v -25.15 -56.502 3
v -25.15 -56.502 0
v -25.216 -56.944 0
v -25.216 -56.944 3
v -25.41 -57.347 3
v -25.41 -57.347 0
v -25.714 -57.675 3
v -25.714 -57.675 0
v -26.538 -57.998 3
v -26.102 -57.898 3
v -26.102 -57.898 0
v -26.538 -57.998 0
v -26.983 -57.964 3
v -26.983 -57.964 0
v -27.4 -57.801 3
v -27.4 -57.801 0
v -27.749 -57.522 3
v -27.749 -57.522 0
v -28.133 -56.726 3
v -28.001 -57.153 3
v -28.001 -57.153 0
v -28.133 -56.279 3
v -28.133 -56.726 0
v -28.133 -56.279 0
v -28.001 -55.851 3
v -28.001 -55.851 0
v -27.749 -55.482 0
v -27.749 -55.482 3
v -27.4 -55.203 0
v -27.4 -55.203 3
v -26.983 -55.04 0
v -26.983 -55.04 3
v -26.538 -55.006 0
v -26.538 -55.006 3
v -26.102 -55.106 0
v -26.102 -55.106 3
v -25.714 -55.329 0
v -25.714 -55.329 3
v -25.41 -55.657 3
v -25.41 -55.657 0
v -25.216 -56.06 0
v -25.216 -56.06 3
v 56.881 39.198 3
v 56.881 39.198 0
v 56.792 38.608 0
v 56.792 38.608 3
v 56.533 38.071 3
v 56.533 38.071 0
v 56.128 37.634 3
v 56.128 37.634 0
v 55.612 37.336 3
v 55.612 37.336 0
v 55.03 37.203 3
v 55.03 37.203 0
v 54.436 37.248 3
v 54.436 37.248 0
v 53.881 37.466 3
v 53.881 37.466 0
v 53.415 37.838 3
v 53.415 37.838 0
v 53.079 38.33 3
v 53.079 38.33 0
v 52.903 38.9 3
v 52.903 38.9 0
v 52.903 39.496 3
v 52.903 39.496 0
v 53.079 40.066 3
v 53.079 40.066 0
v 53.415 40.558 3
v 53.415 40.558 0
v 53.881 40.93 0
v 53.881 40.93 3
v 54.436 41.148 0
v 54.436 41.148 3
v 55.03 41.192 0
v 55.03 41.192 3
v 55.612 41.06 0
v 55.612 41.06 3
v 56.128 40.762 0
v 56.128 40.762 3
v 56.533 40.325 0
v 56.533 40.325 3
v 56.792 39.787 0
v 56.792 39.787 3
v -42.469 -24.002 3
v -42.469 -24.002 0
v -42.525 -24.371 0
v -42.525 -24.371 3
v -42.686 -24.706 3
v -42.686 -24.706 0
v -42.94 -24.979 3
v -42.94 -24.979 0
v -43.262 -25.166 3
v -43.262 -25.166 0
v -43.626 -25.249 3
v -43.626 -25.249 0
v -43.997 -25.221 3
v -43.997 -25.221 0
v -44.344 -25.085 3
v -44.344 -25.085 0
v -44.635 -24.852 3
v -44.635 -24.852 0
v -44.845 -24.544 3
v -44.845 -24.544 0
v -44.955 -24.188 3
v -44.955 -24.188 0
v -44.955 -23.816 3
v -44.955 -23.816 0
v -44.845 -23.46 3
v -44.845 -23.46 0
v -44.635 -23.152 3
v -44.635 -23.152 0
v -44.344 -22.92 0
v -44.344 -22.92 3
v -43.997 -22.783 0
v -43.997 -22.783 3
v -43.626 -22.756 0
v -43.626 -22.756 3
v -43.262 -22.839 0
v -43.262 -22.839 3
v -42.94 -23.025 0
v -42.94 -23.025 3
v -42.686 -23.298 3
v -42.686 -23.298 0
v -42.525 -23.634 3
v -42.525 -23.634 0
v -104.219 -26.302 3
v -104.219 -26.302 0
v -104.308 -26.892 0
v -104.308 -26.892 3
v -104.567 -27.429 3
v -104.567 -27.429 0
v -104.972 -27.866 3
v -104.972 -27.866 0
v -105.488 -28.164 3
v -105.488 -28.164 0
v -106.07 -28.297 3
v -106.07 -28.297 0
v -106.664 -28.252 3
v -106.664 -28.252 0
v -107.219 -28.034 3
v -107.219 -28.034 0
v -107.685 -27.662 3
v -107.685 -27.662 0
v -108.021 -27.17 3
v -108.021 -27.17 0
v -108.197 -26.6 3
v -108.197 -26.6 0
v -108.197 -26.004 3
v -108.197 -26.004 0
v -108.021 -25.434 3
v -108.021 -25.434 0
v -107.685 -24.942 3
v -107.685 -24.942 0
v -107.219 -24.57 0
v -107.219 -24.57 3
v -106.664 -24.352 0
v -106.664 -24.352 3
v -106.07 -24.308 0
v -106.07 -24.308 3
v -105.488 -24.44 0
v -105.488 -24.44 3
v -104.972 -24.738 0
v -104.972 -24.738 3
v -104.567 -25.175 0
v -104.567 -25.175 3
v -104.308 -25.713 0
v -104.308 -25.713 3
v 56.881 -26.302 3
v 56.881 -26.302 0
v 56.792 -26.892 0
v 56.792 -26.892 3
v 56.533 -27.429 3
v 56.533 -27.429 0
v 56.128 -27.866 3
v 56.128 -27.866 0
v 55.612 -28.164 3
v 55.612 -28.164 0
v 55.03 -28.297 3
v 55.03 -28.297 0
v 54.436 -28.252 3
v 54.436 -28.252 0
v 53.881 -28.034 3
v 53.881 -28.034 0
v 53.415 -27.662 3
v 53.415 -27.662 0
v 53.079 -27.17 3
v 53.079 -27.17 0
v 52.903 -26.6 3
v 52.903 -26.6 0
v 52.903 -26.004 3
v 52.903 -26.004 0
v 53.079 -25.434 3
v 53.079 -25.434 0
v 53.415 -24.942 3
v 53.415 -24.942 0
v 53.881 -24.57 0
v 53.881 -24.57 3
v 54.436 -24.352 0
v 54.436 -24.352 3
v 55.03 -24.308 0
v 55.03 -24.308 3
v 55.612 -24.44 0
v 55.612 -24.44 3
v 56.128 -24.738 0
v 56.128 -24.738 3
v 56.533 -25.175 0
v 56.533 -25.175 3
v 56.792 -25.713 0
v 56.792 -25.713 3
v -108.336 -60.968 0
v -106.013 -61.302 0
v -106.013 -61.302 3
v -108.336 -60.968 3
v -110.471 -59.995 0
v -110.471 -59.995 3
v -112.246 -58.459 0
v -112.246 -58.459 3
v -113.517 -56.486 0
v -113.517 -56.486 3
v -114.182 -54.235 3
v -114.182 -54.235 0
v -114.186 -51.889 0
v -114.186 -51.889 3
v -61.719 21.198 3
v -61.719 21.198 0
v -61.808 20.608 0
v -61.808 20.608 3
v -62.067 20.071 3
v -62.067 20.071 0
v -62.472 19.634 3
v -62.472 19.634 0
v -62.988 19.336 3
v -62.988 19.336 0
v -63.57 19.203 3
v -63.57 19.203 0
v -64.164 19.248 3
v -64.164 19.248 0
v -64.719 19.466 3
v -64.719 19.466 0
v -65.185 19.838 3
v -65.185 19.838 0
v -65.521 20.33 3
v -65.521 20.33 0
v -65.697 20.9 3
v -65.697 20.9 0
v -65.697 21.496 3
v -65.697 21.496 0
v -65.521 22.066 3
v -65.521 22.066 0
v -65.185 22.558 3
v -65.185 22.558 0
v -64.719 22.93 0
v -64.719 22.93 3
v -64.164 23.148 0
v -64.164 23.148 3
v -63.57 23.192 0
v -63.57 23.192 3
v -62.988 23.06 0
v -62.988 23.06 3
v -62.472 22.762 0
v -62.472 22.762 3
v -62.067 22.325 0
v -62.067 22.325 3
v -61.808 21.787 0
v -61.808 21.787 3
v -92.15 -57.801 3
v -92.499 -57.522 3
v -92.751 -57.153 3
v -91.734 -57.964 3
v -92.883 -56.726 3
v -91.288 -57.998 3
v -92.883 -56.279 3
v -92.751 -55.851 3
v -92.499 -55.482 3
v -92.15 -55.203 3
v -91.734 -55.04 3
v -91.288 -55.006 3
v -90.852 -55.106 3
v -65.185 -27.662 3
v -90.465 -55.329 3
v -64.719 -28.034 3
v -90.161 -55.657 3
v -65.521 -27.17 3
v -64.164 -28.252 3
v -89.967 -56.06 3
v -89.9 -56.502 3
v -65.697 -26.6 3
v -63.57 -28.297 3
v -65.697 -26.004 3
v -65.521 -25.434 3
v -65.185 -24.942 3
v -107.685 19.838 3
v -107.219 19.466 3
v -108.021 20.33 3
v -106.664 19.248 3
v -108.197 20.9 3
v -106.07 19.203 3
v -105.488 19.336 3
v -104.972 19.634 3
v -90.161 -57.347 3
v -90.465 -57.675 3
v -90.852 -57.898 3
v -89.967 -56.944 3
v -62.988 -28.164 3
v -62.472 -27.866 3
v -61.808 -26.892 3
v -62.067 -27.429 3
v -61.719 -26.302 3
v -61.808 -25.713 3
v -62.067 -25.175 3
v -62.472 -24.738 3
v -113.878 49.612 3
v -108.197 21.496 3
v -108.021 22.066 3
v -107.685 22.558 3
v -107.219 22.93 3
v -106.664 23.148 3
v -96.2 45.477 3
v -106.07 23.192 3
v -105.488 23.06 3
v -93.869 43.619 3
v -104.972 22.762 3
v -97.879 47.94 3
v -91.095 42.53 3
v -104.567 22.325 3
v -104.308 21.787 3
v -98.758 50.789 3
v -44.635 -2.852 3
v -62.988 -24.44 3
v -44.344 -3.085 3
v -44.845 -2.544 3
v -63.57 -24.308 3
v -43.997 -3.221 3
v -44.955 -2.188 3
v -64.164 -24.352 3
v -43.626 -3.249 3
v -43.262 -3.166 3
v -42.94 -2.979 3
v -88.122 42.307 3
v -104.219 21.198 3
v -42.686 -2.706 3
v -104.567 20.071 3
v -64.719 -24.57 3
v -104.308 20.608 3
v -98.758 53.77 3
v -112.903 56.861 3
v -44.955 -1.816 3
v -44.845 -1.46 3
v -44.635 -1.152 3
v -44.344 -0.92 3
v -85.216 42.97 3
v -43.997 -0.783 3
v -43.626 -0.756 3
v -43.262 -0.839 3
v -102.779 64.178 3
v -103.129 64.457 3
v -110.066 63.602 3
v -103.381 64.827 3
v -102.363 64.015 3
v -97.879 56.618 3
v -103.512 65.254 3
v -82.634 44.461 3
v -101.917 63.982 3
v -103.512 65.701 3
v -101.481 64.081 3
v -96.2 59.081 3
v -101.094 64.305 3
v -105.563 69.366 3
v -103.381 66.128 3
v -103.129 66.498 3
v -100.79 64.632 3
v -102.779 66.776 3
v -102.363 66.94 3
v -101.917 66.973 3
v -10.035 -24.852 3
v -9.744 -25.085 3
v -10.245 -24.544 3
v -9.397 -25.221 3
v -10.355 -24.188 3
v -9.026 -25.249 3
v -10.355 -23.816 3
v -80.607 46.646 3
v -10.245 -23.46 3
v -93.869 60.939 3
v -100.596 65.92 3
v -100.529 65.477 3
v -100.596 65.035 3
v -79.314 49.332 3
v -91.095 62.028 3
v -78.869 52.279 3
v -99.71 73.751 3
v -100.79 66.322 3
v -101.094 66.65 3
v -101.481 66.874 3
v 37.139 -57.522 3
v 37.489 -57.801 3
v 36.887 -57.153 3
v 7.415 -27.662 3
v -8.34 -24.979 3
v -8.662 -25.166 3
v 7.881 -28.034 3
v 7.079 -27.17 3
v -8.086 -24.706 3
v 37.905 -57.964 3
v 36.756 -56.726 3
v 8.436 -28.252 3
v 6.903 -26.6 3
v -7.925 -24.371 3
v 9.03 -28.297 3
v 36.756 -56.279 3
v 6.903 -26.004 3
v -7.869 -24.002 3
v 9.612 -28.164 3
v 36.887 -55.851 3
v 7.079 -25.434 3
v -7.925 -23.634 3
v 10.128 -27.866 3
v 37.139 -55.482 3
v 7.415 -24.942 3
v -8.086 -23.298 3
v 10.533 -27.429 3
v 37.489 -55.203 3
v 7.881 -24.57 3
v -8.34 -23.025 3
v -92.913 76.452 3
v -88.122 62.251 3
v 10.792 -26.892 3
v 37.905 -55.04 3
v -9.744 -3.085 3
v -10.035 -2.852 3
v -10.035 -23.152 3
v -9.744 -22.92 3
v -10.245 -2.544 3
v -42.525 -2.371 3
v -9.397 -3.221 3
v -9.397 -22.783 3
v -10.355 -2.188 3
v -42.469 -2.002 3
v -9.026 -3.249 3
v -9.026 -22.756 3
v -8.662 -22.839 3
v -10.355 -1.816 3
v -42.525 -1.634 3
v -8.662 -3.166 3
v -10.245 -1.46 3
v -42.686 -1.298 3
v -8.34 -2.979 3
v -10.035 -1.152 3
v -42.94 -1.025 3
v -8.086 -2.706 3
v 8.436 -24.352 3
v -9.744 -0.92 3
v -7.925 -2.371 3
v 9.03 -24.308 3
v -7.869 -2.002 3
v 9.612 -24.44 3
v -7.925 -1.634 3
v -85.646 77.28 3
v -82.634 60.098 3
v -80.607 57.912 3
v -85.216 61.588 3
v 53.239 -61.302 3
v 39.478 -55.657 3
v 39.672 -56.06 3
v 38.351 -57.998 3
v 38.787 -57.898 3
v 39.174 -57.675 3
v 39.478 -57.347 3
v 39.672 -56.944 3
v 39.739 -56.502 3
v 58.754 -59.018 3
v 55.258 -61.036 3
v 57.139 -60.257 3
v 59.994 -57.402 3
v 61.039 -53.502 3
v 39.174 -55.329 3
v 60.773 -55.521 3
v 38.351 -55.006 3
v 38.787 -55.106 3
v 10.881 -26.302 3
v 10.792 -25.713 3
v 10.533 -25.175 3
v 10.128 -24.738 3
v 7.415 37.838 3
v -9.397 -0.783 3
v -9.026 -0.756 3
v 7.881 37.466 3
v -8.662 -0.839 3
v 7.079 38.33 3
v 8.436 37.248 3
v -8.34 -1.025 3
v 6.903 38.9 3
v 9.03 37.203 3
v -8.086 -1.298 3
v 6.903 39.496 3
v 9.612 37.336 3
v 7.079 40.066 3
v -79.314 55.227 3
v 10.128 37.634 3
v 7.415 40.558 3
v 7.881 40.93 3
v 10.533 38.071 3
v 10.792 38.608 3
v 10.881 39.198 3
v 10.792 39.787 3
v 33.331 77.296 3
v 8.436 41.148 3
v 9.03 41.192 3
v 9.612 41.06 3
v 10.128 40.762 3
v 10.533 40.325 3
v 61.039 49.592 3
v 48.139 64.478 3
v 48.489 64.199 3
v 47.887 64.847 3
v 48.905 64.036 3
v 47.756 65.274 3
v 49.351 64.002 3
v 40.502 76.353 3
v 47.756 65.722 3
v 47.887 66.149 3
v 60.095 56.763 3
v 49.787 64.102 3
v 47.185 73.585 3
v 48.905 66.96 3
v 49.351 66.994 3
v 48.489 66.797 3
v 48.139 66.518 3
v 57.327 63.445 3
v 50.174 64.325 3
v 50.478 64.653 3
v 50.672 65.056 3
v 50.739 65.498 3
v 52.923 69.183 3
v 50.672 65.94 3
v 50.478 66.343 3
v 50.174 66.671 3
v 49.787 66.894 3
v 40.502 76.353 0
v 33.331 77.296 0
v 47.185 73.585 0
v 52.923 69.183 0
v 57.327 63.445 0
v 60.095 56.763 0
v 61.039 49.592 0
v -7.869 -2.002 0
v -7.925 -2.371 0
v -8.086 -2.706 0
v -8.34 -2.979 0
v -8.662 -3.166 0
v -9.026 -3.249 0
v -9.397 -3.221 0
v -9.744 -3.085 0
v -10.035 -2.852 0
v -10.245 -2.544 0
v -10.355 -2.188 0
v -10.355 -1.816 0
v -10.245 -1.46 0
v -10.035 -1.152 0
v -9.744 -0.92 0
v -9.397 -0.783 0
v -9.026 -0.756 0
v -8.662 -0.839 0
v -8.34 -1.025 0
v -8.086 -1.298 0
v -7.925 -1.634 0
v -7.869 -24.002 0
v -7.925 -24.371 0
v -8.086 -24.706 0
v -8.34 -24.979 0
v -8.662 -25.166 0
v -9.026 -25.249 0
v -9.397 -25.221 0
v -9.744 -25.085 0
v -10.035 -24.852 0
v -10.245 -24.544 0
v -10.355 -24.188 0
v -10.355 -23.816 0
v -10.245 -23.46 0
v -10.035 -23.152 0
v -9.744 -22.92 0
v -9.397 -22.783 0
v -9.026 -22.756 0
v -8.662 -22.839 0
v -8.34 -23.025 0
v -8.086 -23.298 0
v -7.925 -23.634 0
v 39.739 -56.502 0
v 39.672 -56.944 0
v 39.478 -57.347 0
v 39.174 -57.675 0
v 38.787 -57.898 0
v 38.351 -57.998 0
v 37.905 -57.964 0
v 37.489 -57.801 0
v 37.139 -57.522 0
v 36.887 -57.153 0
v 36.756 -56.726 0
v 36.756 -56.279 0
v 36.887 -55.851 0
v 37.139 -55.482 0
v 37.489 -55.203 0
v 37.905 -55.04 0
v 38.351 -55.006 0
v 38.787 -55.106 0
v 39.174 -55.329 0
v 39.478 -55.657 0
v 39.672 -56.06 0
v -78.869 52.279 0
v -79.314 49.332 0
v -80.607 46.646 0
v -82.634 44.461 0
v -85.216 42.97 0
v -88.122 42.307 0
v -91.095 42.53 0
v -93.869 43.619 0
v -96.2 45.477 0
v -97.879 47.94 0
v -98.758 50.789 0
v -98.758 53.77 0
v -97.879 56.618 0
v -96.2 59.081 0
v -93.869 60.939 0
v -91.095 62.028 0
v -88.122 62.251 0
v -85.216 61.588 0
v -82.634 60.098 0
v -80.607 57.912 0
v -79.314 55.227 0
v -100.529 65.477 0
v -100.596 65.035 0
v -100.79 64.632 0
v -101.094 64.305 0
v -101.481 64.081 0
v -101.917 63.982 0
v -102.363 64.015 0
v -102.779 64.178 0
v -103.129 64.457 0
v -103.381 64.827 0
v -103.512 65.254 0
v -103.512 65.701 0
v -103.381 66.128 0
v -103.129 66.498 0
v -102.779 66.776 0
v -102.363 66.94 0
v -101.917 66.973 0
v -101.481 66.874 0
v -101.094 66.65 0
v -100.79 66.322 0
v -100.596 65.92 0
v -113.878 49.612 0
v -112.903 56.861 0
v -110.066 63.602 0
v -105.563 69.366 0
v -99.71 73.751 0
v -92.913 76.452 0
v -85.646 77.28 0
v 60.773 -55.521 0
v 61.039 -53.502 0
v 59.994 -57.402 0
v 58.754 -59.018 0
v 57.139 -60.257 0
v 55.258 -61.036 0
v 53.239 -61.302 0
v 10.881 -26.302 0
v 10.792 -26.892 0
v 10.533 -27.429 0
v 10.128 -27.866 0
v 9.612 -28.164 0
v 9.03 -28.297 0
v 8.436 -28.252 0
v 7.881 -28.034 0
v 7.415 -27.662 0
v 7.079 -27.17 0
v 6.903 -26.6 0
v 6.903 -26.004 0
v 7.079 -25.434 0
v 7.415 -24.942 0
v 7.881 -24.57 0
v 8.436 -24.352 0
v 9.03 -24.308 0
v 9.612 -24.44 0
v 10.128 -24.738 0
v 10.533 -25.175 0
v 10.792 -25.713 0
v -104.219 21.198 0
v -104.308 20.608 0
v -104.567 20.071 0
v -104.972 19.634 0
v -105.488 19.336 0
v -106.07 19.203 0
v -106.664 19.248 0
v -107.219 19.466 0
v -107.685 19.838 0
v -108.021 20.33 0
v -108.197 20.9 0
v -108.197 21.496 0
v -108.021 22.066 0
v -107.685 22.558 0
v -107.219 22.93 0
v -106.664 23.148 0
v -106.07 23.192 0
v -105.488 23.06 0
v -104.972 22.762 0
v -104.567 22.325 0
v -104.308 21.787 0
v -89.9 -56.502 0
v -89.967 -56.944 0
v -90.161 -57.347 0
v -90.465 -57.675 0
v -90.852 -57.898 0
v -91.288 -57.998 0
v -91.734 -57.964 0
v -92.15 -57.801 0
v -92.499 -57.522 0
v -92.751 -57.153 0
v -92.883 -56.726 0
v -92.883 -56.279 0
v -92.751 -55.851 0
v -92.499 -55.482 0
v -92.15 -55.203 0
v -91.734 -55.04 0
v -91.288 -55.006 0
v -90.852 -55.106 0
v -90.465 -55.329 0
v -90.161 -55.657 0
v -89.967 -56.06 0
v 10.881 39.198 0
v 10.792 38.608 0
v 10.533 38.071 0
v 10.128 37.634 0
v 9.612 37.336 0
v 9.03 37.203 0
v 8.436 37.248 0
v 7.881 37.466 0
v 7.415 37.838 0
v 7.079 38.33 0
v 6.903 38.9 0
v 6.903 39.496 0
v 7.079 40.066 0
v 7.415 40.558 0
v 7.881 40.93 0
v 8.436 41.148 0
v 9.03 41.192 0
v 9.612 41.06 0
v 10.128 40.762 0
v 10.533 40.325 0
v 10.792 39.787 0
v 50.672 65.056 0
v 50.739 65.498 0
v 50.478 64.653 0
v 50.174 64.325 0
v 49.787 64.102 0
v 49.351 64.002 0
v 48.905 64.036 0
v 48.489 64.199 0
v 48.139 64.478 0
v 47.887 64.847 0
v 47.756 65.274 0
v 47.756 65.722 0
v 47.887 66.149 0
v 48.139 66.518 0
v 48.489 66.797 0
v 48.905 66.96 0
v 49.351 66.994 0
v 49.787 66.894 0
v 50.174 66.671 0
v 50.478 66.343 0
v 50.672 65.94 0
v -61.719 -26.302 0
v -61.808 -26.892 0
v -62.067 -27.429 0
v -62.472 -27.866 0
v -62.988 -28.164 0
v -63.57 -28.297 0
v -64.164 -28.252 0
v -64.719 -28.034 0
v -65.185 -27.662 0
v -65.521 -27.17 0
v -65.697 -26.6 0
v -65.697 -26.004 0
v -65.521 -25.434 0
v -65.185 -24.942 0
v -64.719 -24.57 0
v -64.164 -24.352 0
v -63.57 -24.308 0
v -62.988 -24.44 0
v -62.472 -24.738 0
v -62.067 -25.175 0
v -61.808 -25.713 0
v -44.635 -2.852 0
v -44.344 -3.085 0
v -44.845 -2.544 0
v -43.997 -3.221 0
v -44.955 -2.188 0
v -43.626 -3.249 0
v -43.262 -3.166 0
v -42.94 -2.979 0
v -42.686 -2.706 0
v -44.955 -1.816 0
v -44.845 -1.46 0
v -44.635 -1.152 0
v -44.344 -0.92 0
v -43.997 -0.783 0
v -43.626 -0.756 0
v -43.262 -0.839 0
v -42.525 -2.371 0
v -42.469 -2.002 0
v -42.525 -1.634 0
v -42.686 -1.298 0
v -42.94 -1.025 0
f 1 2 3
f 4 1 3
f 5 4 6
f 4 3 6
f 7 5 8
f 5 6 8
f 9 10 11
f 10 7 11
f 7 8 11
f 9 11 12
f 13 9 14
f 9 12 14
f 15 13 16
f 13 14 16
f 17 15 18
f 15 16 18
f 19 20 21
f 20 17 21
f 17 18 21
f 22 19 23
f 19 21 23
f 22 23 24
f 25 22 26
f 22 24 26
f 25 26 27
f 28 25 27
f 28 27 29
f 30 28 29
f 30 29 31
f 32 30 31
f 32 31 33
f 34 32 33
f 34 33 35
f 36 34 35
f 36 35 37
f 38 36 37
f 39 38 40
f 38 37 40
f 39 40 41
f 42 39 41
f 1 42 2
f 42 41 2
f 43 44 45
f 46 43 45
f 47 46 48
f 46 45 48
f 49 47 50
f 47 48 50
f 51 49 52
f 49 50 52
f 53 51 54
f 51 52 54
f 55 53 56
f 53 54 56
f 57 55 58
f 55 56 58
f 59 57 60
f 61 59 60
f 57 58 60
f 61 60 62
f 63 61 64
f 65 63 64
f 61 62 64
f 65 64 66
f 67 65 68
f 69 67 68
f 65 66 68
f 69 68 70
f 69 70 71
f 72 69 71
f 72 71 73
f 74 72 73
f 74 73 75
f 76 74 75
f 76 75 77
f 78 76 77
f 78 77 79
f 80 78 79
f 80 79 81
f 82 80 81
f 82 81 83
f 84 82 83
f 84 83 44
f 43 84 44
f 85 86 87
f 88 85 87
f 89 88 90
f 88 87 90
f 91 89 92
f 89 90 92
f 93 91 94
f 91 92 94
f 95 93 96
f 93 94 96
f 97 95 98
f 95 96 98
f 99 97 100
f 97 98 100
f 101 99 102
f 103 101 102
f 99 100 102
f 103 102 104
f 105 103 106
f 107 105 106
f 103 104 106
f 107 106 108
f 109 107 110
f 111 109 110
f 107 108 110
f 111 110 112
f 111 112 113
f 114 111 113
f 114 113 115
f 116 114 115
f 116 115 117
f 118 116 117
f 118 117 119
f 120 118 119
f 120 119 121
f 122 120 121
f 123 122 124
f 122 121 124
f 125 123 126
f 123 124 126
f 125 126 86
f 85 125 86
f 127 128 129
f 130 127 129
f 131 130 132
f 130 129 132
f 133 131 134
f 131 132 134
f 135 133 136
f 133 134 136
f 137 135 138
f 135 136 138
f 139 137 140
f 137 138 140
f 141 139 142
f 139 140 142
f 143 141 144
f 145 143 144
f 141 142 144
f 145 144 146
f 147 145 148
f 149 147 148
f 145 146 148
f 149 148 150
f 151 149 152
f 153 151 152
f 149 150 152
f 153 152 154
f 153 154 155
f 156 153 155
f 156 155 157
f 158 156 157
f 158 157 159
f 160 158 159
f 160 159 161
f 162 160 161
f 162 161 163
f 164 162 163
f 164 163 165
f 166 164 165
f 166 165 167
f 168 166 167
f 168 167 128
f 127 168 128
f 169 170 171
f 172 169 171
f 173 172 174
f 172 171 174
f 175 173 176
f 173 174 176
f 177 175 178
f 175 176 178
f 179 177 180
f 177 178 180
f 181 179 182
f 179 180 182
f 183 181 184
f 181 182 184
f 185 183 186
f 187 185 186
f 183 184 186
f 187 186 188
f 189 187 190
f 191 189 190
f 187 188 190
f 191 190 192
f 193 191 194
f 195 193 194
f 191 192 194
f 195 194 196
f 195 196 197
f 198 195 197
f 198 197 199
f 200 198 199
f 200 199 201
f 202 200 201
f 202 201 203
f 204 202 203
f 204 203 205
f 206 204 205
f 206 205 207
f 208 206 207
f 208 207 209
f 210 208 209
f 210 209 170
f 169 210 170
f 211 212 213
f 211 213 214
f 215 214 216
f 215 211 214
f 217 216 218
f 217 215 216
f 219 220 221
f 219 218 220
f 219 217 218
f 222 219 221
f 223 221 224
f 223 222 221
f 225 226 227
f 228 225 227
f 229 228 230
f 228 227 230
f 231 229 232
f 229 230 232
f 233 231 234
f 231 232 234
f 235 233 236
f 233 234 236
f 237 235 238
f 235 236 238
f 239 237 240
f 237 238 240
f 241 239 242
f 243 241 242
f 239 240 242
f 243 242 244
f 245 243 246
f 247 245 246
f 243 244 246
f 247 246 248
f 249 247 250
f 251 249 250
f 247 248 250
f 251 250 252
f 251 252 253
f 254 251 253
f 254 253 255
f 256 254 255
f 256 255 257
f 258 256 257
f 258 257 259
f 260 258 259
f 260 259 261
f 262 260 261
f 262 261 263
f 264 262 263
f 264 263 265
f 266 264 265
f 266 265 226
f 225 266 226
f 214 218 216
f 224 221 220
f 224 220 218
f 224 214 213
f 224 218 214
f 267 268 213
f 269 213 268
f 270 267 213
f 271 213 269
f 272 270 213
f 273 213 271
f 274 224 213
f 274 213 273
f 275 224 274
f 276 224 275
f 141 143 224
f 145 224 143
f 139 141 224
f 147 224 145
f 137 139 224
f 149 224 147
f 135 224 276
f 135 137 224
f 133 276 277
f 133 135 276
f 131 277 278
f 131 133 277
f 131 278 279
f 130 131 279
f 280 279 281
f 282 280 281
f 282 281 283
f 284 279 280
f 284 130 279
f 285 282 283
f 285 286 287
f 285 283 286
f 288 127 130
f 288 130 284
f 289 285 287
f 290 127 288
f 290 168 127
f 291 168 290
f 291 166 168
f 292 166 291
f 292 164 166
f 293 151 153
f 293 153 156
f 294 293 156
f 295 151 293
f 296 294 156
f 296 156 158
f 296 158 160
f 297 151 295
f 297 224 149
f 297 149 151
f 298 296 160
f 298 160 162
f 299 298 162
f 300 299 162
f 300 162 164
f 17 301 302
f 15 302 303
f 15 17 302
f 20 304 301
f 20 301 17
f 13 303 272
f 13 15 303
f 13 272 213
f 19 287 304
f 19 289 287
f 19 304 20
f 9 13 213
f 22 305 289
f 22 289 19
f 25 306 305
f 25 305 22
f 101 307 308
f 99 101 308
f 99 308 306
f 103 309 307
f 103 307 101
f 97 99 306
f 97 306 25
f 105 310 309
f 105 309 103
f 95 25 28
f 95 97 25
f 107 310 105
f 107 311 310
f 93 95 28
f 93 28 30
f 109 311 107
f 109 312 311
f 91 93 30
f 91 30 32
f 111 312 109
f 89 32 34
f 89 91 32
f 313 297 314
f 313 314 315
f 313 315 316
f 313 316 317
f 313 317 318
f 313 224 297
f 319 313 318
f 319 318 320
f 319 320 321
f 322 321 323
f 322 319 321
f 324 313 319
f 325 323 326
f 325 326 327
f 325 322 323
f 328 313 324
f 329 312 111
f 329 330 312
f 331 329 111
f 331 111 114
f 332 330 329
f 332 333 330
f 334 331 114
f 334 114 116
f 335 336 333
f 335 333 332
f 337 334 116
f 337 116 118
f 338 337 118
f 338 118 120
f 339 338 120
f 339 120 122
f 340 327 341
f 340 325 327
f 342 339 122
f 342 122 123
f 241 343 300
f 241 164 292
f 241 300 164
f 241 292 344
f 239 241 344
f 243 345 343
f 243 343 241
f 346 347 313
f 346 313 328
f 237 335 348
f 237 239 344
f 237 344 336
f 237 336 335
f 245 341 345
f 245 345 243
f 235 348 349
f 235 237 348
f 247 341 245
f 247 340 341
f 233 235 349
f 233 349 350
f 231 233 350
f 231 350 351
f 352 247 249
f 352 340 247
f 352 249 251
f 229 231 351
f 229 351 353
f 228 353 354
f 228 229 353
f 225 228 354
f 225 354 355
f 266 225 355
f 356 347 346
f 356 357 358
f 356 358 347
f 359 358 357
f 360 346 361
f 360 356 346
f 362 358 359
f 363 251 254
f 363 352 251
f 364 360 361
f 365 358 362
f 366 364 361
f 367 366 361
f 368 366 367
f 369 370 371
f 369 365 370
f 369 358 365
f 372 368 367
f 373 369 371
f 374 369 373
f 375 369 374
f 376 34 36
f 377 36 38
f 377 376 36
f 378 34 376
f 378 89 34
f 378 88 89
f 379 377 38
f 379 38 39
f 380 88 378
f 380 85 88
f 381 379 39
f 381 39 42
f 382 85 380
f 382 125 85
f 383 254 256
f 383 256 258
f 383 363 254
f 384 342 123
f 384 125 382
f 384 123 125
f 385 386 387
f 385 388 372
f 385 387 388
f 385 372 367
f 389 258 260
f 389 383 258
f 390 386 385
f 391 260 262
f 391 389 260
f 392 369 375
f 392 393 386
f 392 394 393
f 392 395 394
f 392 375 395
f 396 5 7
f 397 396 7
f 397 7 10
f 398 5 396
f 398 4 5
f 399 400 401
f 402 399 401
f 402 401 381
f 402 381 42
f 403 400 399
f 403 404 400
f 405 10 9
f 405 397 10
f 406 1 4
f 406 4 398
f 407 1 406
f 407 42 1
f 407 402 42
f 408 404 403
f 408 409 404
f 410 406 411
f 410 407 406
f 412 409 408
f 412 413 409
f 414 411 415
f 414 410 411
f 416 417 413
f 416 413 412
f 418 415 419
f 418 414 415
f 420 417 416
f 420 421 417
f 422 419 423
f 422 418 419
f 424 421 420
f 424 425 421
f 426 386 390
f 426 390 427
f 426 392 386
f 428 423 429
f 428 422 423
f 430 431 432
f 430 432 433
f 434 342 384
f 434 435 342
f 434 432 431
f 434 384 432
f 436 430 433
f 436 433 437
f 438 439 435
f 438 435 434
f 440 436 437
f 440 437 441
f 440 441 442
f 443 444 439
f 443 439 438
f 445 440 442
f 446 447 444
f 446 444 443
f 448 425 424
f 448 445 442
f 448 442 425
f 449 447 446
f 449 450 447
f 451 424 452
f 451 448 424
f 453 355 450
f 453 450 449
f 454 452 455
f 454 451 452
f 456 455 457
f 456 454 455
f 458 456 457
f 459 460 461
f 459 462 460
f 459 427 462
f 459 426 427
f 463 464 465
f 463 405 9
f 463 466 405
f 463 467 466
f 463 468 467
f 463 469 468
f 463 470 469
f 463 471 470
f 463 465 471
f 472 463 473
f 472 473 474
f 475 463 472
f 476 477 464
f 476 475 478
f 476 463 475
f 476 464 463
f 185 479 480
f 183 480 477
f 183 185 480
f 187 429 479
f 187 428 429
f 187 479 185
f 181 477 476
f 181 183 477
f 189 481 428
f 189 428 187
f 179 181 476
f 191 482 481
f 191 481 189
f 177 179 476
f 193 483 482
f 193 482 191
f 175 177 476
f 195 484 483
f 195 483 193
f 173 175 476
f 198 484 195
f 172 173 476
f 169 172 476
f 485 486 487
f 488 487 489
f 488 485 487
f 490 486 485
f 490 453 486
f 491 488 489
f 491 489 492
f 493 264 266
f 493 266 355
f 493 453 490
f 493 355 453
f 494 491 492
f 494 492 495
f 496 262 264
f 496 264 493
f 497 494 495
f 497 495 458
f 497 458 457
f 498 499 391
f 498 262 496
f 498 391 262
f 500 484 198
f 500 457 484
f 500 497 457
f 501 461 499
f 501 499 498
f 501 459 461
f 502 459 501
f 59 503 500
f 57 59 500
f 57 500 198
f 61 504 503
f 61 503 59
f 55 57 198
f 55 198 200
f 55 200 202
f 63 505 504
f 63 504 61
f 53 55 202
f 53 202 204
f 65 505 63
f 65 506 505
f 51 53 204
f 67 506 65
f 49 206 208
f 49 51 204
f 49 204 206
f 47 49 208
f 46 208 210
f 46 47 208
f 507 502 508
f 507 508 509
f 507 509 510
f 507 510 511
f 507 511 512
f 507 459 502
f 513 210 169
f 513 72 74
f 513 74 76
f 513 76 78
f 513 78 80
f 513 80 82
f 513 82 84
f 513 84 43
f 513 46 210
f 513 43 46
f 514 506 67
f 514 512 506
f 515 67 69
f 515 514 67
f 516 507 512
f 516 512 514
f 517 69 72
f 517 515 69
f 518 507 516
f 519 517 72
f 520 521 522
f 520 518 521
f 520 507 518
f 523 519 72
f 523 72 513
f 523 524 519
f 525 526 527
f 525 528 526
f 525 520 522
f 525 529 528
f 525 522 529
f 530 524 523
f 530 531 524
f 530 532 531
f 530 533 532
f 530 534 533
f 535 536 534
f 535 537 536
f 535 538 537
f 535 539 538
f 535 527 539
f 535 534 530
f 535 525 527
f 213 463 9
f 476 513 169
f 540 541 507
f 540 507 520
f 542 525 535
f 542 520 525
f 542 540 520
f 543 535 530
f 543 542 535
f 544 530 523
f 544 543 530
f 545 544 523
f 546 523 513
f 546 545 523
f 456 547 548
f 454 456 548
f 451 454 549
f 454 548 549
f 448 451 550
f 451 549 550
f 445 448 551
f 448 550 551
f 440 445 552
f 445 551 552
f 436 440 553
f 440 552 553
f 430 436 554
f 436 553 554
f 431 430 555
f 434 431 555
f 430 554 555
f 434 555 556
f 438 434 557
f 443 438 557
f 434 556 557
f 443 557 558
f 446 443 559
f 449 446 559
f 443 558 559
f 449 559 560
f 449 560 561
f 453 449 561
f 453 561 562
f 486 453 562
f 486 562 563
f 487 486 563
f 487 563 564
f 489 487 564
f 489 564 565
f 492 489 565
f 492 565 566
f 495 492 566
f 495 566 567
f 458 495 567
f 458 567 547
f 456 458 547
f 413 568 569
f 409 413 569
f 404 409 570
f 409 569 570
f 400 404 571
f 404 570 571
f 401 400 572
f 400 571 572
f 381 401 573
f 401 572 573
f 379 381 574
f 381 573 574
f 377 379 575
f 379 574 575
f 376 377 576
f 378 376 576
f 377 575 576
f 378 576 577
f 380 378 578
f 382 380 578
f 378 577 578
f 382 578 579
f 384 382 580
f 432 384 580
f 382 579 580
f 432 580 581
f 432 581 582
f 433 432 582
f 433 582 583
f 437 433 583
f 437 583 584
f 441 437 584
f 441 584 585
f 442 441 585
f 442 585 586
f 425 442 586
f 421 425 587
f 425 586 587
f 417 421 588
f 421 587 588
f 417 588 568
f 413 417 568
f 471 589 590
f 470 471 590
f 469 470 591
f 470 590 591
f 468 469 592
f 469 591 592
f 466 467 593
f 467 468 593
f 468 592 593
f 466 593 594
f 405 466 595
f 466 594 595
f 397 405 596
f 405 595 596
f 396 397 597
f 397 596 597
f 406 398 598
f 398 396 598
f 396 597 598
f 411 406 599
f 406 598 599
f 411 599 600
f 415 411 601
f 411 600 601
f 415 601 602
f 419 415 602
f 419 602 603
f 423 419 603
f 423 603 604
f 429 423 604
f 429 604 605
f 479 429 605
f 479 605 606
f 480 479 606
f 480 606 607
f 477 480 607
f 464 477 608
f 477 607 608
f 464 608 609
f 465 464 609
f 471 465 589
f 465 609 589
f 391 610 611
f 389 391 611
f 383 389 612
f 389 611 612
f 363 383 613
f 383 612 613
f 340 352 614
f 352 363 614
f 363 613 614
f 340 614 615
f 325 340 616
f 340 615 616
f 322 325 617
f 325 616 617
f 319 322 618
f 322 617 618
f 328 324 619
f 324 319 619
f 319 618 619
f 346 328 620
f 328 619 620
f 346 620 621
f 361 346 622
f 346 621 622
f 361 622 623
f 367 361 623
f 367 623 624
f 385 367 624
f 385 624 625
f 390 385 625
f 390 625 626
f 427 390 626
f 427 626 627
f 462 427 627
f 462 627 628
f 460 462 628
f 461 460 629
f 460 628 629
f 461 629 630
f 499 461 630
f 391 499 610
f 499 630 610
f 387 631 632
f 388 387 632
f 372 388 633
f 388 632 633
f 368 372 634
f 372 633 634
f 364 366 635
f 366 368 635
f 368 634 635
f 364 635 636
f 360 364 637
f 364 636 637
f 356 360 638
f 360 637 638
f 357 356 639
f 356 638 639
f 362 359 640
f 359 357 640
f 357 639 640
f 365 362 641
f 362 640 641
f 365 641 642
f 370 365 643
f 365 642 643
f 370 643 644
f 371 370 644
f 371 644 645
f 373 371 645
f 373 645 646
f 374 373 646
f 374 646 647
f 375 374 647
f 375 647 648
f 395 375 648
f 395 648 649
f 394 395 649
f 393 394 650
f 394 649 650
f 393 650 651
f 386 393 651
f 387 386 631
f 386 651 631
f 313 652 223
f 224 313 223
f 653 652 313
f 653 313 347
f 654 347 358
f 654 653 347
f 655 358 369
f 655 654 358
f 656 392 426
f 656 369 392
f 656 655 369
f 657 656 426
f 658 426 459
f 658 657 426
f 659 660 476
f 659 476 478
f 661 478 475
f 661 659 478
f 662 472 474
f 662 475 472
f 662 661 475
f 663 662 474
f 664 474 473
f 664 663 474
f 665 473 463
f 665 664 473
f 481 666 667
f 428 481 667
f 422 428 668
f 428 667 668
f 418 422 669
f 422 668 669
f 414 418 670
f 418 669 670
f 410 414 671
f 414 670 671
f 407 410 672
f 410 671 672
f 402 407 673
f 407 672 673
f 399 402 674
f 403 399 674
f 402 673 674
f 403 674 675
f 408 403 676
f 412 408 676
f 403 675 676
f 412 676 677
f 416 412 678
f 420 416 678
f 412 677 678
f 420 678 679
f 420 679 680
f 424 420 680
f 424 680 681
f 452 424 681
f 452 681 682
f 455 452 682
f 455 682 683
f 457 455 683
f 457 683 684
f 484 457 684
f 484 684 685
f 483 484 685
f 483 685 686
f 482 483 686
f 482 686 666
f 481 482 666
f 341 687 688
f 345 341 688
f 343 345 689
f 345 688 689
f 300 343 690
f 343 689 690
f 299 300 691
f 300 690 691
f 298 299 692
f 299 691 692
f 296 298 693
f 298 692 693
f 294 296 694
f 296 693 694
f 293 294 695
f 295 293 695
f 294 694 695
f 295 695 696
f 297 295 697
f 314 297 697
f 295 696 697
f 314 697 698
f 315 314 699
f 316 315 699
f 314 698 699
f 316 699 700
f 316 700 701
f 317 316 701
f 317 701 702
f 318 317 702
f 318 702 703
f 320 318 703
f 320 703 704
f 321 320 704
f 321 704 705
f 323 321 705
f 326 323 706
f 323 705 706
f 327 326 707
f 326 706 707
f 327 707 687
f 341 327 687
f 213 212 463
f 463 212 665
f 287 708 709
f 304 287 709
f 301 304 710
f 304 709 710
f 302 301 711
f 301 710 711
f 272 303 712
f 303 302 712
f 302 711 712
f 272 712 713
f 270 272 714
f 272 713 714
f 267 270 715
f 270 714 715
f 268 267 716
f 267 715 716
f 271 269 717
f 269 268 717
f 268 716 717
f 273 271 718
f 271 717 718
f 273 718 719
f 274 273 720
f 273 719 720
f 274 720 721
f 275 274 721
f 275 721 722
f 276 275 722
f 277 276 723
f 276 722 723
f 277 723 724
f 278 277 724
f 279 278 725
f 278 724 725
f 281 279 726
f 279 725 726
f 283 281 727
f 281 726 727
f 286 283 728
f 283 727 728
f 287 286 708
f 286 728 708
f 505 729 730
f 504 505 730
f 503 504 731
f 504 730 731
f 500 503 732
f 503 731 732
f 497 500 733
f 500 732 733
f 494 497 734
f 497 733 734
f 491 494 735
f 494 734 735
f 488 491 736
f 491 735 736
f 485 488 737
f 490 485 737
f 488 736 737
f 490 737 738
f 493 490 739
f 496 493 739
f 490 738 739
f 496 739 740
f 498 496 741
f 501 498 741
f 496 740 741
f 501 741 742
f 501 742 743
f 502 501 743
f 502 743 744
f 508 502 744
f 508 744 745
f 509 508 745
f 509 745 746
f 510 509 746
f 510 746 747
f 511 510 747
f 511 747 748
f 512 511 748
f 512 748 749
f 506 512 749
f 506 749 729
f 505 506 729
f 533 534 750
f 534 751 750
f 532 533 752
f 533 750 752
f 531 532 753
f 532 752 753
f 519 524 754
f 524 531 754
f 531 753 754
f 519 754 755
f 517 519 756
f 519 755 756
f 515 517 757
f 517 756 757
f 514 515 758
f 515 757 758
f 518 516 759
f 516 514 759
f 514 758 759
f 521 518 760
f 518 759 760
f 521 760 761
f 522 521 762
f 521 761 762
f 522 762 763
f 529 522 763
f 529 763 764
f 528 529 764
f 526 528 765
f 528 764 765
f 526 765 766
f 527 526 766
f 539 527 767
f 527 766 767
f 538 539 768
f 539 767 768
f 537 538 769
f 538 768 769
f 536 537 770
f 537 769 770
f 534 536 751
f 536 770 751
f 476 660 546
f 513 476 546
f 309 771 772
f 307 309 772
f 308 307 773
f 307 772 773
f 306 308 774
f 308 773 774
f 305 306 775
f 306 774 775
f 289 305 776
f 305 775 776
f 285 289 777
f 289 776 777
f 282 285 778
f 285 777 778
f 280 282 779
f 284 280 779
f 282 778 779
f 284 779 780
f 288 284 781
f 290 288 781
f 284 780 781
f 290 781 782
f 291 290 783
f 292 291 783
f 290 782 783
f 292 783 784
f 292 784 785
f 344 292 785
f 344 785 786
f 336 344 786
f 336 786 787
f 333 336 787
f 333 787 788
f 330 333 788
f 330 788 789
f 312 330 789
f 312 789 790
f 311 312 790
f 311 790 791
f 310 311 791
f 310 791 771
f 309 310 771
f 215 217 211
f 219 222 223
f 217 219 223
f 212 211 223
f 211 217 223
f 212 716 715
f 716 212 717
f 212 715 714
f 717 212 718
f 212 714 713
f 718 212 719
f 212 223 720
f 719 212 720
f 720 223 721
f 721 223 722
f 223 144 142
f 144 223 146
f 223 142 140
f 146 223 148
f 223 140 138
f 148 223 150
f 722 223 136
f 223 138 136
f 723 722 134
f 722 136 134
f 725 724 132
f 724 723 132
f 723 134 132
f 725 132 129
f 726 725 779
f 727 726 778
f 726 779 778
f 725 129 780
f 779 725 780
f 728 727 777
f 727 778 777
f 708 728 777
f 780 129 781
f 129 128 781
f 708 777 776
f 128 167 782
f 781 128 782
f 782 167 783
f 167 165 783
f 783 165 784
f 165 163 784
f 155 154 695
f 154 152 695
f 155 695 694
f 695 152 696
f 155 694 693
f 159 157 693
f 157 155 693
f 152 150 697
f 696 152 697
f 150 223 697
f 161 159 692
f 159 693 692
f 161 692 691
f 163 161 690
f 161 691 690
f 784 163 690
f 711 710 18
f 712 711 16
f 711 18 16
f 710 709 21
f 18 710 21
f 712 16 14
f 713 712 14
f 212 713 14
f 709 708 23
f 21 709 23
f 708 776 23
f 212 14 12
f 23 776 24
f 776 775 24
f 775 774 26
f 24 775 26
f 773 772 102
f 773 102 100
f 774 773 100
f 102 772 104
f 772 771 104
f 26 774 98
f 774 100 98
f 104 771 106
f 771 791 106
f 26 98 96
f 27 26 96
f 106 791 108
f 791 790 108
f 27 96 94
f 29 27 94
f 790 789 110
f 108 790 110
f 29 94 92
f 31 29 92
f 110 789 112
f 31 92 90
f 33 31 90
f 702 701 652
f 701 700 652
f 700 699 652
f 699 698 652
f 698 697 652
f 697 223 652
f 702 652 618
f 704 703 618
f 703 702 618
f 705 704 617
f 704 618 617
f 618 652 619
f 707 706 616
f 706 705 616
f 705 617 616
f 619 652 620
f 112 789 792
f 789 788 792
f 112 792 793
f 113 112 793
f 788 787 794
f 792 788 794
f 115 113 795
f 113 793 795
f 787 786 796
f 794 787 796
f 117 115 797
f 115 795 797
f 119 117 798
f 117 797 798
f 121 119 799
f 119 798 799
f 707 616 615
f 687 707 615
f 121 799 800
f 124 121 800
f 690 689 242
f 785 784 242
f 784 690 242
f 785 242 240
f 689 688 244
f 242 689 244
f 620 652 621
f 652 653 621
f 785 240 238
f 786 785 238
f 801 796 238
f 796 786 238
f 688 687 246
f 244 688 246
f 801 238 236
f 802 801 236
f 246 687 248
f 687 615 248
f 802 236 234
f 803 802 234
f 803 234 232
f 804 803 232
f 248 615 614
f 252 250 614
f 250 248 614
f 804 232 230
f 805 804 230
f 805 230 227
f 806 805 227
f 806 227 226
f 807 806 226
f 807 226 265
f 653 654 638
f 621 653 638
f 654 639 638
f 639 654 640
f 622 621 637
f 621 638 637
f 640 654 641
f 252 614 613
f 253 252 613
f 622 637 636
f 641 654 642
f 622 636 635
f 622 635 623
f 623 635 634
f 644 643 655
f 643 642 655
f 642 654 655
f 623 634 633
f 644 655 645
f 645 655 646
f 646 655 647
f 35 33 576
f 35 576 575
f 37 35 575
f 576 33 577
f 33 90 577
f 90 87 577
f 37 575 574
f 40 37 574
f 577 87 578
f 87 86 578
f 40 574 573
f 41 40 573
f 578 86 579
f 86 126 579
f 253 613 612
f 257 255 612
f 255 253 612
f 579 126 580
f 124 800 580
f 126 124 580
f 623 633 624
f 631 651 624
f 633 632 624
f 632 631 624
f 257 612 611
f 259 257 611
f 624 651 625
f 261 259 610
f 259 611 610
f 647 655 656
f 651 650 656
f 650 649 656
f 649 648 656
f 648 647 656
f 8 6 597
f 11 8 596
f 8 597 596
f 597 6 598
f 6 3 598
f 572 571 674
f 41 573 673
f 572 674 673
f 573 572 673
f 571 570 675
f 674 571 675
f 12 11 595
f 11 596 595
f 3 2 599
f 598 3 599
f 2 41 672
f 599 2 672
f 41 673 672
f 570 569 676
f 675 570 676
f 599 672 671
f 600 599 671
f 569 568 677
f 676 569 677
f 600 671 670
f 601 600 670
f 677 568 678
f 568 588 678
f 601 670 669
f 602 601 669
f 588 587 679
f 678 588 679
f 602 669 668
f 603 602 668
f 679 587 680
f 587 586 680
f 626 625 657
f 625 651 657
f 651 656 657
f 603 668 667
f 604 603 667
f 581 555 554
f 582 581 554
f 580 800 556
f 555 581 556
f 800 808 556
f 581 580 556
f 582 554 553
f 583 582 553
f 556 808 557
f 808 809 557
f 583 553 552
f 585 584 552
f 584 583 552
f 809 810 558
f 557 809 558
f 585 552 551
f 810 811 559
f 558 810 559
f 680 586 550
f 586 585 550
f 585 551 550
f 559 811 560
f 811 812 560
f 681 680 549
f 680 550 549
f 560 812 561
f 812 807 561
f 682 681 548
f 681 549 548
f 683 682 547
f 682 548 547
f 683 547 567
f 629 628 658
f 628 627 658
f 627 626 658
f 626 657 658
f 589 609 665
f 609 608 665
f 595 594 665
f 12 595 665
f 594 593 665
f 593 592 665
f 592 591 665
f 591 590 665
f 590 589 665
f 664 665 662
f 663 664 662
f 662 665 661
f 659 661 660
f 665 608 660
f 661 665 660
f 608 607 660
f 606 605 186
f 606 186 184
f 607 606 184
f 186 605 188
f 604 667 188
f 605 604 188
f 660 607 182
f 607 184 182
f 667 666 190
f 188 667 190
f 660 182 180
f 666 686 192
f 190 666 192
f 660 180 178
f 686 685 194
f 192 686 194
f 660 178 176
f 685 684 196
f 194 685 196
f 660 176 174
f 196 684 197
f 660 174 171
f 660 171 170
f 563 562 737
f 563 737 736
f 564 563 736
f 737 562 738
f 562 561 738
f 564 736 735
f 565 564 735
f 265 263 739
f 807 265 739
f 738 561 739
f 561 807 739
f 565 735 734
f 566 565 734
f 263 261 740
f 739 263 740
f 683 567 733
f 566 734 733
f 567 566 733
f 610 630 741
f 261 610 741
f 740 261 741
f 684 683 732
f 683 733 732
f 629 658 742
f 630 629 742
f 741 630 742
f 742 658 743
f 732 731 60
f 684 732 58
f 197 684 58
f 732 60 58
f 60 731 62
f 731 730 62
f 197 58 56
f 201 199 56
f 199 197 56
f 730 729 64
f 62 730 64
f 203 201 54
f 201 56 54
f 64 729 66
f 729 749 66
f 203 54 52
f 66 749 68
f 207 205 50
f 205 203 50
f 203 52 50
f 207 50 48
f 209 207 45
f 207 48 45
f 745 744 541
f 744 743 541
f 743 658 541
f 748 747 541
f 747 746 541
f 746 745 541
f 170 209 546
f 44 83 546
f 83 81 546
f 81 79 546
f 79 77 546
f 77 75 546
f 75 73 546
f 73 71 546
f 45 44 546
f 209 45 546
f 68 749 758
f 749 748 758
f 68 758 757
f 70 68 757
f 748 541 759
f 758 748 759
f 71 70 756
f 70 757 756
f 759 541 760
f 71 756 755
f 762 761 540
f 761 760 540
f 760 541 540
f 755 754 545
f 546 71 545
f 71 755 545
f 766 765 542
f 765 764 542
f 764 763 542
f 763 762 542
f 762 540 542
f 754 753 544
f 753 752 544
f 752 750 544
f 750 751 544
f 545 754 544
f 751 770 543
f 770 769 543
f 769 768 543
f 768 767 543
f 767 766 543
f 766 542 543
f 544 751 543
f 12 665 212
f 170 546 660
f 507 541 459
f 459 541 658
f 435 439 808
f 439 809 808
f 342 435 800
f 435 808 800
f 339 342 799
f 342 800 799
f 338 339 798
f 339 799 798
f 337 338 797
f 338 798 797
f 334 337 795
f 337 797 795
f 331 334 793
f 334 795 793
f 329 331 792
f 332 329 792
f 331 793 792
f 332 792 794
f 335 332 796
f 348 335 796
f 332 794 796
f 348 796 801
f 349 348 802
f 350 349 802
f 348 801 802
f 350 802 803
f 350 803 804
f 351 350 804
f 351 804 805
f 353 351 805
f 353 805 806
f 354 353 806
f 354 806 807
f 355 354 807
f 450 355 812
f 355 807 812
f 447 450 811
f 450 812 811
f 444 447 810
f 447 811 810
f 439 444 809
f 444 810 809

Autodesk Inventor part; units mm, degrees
ref_plane "YZ Plane" through (0, 0, 0) normal (1, 0, 0) x (0, 1, 0)
ref_plane "XZ Plane" through (0, 0, 0) normal (0, 1, 0) x (-1, 0, 0)
ref_plane "XY Plane" through (0, 0, 0) normal (0, 0, 1) x (1, 0, 0)
sketch "Sketch1" plane through (0, 0, 0) normal (0, 0, 1) x (1, 0, 0)
  arc A0 (-85.6258, 79.4796) -> (-116.0775, 49.6172) centre (-86.1702, 49.5773) ccw
  line L0 (-85.6258, 79.4796) -> (33.3305, 79.4959)
  arc A1 (63.2389, 49.5916) -> (33.3305, 79.4959) centre (33.3346, 49.5916) ccw
  line L1 (63.2389, -50.9075) -> (63.2389, 49.5916)
  line L2 (63.2389, 49.5916) -> (63.2389, -53.5021)
  line L3 (-116.0775, 49.6172) -> (-116.3855, -51.7391)
  line L4 (-116.0775, 49.6172) -> (-116.0775, -50.4074)
  line L5 (-106.0129, -63.5021) -> (53.2389, -63.5021)
  arc A2 (53.2389, -63.5021) -> (63.2389, -53.5021) centre (53.2389, -53.5021) ccw
  arc A3 (-86.7039, 77.4795) -> (-114.0775, 49.6129) centre (-86.1702, 49.5773) ccw
  line L6 (-86.7039, 77.4795) -> (33.3308, 77.4959)
  arc A4 (61.2389, 49.5916) -> (33.3308, 77.4959) centre (33.3346, 49.5916) ccw
  line L7 (61.2389, 49.5916) -> (61.2389, -53.5021)
  arc A5 (53.2389, -61.5021) -> (61.2389, -53.5021) centre (53.2389, -53.5021) ccw
  line L8 (53.2389, -61.5021) -> (-106.0129, -61.5021)
  arc A6 (-114.3859, -51.8743) -> (-106.0129, -61.5021) centre (-106.0129, -53.0473) ccw
  line L9 (-114.3859, -51.8743) -> (-114.0775, 49.6129)
  line L10 (33.3308, 77.2959) -> (-85.6461, 77.2796)
  arc A7 (-85.6461, 77.2796) -> (-113.8775, 49.6124) centre (-86.1702, 49.5773) ccw
  line L11 (-113.8775, 49.6124) -> (-114.1859, -51.8886)
  arc A8 (-114.1859, -51.8886) -> (-106.0129, -61.3021) centre (-106.0129, -53.0473) ccw
  line L12 (-106.0129, -61.3021) -> (53.2389, -61.3021)
  arc A9 (53.2389, -61.3021) -> (61.0389, -53.5021) centre (53.2389, -53.5021) ccw
  line L13 (61.0389, -53.5021) -> (61.0389, 49.5916)
  arc A10 (61.0389, 49.5916) -> (33.3308, 77.2959) centre (33.3346, 49.5916) ccw
  circle A11 centre (-102.0292, 65.4774) radius 1.5
  circle A12 centre (49.2389, 65.498) radius 1.5
  circle A13 centre (-26.6496, -56.5021) radius 1.5
  circle A14 centre (-91.3999, -56.5021) radius 1.5
  circle A15 centre (38.2389, -56.5021) radius 1.5
  line L14 (-116.0775, -2.0021) -> (63.2389, -2.0021)
  line L15 (-43.7191, -2.0021) -> (-9.1191, -2.0021)
  line L16 (-9.1191, -2.0021) -> (-9.1191, -24.0021)
  line L17 (-9.1191, -24.0021) -> (-43.7191, -24.0021)
  line L18 (-43.7191, -24.0021) -> (-43.7191, -2.0021)
  circle A16 centre (-43.7191, -2.0021) radius 1.25
  circle A17 centre (-9.1191, -2.0021) radius 1.25
  circle A18 centre (-9.1191, -24.0021) radius 1.25
  circle A19 centre (-43.7191, -24.0021) radius 1.25
  line L19 (-63.7191, 9.7883) -> (-63.7191, -26.3021)
  circle A20 centre (-63.7191, 21.1979) radius 2
  circle A21 centre (-63.7191, -26.3021) radius 2
  line L20 (-63.7191, 21.1979) -> (-106.2191, 21.1979)
  line L21 (-63.7191, -26.3021) -> (-106.2191, -26.3021)
  line L22 (-106.2191, -26.3021) -> (-106.2191, 21.1979)
  circle A22 centre (-106.2191, 21.1979) radius 2
  circle A23 centre (-106.2191, -26.3021) radius 2
  line L23 (-63.7191, 9.7883) -> (-63.7191, 21.1979)
  line L24 (-109.1691, 24.1479) -> (-60.7691, 24.1479)
  line L25 (-60.7691, 24.1479) -> (-60.7691, 9.7883)
  line L26 (-60.7691, 9.7883) -> (-60.7691, -29.2521)
  line L27 (-60.7691, -29.2521) -> (-109.1691, -29.2521)
  line L28 (-109.1691, -29.2521) -> (-109.1691, 24.1479)
  line L29 (8.8809, 39.1979) -> (54.8809, 39.1979)
  line L30 (54.8809, 39.1979) -> (54.8809, -26.3021)
  line L31 (54.8809, -26.3021) -> (8.8809, -26.3021)
  line L32 (8.8809, -26.3021) -> (8.8809, 39.1979)
  circle A24 centre (8.8809, 39.1979) radius 2
  circle A25 centre (54.8809, 39.1979) radius 2
  circle A26 centre (8.8809, -26.3021) radius 2
  circle A27 centre (54.8809, -26.3021) radius 2
  circle A28 centre (-88.8693, 52.2792) radius 10
  point P0 (0, 0)
  point P1 (44.321, -53.9075)
  point P2 (51.321, -50.9075)
  point P3 (-9.1191, -13.0021)
  point P4 (-84.9691, -26.3021)
  dimension "d0" = 10
  dimension "d1" = 2
  dimension "d2" = 0.2
  dimension "d3" = 3
  dimension "d4" = 3
  dimension "d5" = 3
  dimension "d6" = 3
  dimension "d7" = 3
  dimension "d8" = 14
  dimension "d9" = 14
  dimension "d10" = 14
  dimension "d11" = 14
  dimension "d12" = 89.75
  dimension "d13" = 7
  dimension "d14" = 7
  dimension "d15" = 7
  dimension "d16" = 25
  dimension "d17" = 25
  dimension "d20" = 61.5
  dimension "d21" = 34.6
  dimension "d22" = 22
  dimension "d23" = 2.5
  dimension "d24" = 2.5
  dimension "d25" = 2.5
  dimension "d26" = 2.5
  dimension "d27" = 0
  dimension "d28" = 179.3164
  dimension "d29" = 72.358
  dimension "d32" = 20
  dimension "d33" = 47.5
  dimension "d34" = 4
  dimension "d35" = 4
  dimension "d36" = 42.5
  dimension "d37" = 4
  dimension "d38" = 4
  dimension "d39" = 48.4
  dimension "d51" = 46
  dimension "d52" = 65.5
  dimension "d53" = 18
  dimension "d54" = 35
  dimension "d55" = 35
  dimension "d56" = 4
  dimension "d57" = 4
  dimension "d58" = 4
  dimension "d59" = 4
  dimension "d62" = 20
  dimension "d63" = 25
  dimension "d64" = 25
  dimension "d67" = 27.7043
extrude "Extrusion1" add sketch "Sketch1" along normal blind 3 contours L14 L28 L27 L26 A16 L18 A19 L17 A18 L16 A17 L32 A26 L31 A27 L30 L13 A9 L12 A8 L11 | L11 A7 L10 A10 L13 L14 L30 A25 L29 A24 L32 A17 A16 L26 L25 L24 L28 | L28 L24 L25 L26 L14 L19 L23 A20 L20 A22 L22 | L14 L22 A23 L21 A21 L19 L26 L27 L28 | L22 A22 L20 A20 L23 L19 L14 | L14 L19 A21 L21 A23 L22 | L30 A27 L31 A26 L32 L14 | L14 L32 A24 L29 A25 L30 | A23 L21 L22 | L22 L21 A23 | A22 L20 L22 | L22 L20 A22 | A25 L29 L30 | L30 L29 A25 | A27 L31 L30 | L30 L31 A27 | A21 L21 L19 | L19 L21 A21 | A17 L16 L14 | L14 A17 | A26 L31 L32 | L32 L31 A26 | A24 L29 L32 | L32 L29 A24 | A16 L14 | L14 L18 A16 | L23 L20 A20 | A20 L20 L23 | L16 A17 L14 | A17 L16 A18 L17 A19 L18 A16 L14 | L14 A16 L18 | A18 L17 L16 | L16 L17 A18 | A19 L17 L18 | L18 L17 A19 | A28
extrude "Extrusion2" cut sketch "Sketch1" along normal up to surface (3 mm away) contours A17 L16 L14 | L14 A17 | A16 L14 | L14 L18 A16 | L16 A17 L14 | L14 A16 L18 | A18 L17 L16 | L16 L17 A18 | A19 L17 L18 | L18 L17 A19
extrude "Extrusion3" cut sketch "Sketch1" along normal blind 3 contours A23 L21 L22 | L22 L21 A23 | A22 L20 L22 | L22 L20 A22 | A21 L21 L19 | L19 L21 A21 | L23 L20 A20 | A20 L20 L23
extrude "Extrusion5" cut sketch "Sketch1" along normal up to surface (3 mm away) contours A25 L29 L30 | L30 L29 A25 | A27 L31 L30 | L30 L31 A27 | A26 L31 L32 | L32 L31 A26 | A24 L29 L32 | L32 L29 A24
extrude "Extrusion6" cut sketch "Sketch1" along normal blind 3 contours A28
properties part number "Final_Back_Cover_1"
